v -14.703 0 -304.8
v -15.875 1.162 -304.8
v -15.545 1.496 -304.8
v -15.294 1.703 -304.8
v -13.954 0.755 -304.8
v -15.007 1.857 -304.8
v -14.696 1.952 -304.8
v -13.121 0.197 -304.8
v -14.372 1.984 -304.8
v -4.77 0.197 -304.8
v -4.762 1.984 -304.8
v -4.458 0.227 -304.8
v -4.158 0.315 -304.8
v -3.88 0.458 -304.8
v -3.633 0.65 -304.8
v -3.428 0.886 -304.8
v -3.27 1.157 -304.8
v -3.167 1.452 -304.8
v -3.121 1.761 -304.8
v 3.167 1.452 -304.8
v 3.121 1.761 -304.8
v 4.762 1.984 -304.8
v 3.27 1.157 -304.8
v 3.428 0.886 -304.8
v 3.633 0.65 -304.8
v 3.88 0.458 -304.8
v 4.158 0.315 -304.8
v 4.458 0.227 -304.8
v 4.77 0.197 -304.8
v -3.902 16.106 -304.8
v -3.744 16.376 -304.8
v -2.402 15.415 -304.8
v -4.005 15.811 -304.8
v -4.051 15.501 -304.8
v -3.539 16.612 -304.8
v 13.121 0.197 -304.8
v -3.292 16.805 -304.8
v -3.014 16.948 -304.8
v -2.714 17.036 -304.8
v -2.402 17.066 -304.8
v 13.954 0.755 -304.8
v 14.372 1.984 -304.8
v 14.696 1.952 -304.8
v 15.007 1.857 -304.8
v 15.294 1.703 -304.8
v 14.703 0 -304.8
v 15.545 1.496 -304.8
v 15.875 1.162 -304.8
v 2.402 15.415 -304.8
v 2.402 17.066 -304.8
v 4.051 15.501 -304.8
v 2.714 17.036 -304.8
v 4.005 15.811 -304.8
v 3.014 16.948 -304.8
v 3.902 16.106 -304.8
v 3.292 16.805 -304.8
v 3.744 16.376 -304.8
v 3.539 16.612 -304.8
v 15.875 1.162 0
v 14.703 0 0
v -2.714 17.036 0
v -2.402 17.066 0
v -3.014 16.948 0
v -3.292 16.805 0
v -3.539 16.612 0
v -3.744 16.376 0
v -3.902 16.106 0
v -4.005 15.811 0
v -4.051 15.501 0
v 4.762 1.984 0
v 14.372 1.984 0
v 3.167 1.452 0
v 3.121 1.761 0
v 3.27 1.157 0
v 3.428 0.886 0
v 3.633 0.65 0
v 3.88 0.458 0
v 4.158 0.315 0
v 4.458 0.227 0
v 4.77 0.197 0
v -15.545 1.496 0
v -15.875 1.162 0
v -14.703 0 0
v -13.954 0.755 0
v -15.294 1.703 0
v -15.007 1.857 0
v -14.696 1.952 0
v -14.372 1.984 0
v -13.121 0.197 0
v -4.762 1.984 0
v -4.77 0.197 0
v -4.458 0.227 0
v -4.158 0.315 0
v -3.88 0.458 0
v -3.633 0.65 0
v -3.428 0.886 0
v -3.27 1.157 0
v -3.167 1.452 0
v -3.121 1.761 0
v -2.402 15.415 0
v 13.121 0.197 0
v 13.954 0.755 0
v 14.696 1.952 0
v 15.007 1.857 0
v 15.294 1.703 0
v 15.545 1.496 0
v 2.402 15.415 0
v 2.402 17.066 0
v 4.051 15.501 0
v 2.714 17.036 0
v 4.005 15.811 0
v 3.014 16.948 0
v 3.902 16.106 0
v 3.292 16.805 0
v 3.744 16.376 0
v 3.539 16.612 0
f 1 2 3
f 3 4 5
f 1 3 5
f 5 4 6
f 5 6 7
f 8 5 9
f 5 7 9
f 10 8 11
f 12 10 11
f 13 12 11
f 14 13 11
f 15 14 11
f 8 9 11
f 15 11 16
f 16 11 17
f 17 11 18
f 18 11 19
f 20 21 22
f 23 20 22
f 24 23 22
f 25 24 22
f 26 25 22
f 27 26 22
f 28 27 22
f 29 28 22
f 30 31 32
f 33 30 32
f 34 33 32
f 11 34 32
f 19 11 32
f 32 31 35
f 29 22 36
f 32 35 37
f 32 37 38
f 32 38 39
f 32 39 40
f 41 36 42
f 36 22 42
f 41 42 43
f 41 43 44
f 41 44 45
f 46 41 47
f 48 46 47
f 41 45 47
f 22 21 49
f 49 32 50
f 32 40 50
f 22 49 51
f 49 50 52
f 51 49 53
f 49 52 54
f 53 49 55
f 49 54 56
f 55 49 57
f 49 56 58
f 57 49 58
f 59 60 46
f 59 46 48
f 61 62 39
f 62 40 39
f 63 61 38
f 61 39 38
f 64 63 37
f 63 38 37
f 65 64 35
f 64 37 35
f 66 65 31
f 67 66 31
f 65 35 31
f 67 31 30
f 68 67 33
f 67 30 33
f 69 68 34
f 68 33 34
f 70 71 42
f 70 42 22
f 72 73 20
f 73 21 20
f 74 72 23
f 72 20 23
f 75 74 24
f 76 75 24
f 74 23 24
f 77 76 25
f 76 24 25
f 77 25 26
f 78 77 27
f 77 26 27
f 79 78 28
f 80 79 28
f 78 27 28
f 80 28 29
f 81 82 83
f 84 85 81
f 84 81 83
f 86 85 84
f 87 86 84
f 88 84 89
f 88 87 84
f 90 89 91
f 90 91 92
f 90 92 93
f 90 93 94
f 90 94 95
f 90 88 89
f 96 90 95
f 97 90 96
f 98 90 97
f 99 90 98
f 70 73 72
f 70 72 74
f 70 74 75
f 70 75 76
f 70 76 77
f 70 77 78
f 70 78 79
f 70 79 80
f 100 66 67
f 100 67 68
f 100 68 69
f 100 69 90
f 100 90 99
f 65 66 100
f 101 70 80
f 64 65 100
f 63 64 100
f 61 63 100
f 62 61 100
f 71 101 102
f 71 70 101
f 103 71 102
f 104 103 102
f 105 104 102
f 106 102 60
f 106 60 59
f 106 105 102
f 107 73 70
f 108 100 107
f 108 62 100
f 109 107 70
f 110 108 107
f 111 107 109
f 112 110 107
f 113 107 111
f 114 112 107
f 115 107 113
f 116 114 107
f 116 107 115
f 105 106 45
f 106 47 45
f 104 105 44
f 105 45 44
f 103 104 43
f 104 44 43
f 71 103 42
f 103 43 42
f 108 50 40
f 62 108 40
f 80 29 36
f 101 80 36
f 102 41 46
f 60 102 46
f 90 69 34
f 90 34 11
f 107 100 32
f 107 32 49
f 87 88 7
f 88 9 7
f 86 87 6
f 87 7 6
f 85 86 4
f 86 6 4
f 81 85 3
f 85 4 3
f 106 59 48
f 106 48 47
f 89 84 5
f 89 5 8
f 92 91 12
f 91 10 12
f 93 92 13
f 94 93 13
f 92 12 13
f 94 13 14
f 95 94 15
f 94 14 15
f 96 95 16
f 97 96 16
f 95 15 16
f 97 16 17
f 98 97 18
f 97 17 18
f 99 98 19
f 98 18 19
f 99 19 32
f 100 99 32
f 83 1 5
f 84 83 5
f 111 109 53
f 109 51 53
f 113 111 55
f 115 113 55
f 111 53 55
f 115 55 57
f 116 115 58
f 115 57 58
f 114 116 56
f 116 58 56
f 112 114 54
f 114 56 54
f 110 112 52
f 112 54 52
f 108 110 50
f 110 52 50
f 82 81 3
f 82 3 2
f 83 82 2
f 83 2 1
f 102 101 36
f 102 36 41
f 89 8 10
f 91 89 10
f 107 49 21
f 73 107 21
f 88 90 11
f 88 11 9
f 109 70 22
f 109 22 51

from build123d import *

# Parameters (mm, degrees)
BOSS_EXTRUDE1_DEPTH = 304.8
FILLET1_R           = 1.651


with BuildPart() as part:
    # Sketch1 → Boss-Extrude1 (new body)
    with BuildSketch(Plane.XY):
        Polygon((-4.7625, 1.984375), (-15.060088734, 1.984375), (-15.875, 1.162346283), (-14.702501762, 0), (-13.954431554, 0.754603868), (-13.121373906, 0.197134811), (-3.203280151, 0.197134811), (-2.402359615, 15.414625), (0, 15.414625), (2.402359615, 15.414625), (3.203280151, 0.197134811), (13.121373906, 0.197134811), (13.954431554, 0.754603868), (14.702501762, 0), (15.875, 1.162346283), (15.060088734, 1.984375), (4.7625, 1.984375), (3.96875, 17.065625), (0, 17.065625), (-3.96875, 17.065625), align=None)
    extrude(amount=-BOSS_EXTRUDE1_DEPTH)

    # Fillet1
    fillet1_edges = [part.edges().sort_by_distance(p)[0] for p in [
        (-15.060088734, 1.984375, -152.4),
        (-3.96875, 17.065625, -152.4),
        (3.96875, 17.065625, -152.4),
        (15.060088734, 1.984375, -152.4),
        (3.203280151, 0.197134811, -152.4),
        (-3.203280151, 0.197134811, -152.4),
    ]]
    fillet(fillet1_edges, radius=FILLET1_R)


solid = part.part
